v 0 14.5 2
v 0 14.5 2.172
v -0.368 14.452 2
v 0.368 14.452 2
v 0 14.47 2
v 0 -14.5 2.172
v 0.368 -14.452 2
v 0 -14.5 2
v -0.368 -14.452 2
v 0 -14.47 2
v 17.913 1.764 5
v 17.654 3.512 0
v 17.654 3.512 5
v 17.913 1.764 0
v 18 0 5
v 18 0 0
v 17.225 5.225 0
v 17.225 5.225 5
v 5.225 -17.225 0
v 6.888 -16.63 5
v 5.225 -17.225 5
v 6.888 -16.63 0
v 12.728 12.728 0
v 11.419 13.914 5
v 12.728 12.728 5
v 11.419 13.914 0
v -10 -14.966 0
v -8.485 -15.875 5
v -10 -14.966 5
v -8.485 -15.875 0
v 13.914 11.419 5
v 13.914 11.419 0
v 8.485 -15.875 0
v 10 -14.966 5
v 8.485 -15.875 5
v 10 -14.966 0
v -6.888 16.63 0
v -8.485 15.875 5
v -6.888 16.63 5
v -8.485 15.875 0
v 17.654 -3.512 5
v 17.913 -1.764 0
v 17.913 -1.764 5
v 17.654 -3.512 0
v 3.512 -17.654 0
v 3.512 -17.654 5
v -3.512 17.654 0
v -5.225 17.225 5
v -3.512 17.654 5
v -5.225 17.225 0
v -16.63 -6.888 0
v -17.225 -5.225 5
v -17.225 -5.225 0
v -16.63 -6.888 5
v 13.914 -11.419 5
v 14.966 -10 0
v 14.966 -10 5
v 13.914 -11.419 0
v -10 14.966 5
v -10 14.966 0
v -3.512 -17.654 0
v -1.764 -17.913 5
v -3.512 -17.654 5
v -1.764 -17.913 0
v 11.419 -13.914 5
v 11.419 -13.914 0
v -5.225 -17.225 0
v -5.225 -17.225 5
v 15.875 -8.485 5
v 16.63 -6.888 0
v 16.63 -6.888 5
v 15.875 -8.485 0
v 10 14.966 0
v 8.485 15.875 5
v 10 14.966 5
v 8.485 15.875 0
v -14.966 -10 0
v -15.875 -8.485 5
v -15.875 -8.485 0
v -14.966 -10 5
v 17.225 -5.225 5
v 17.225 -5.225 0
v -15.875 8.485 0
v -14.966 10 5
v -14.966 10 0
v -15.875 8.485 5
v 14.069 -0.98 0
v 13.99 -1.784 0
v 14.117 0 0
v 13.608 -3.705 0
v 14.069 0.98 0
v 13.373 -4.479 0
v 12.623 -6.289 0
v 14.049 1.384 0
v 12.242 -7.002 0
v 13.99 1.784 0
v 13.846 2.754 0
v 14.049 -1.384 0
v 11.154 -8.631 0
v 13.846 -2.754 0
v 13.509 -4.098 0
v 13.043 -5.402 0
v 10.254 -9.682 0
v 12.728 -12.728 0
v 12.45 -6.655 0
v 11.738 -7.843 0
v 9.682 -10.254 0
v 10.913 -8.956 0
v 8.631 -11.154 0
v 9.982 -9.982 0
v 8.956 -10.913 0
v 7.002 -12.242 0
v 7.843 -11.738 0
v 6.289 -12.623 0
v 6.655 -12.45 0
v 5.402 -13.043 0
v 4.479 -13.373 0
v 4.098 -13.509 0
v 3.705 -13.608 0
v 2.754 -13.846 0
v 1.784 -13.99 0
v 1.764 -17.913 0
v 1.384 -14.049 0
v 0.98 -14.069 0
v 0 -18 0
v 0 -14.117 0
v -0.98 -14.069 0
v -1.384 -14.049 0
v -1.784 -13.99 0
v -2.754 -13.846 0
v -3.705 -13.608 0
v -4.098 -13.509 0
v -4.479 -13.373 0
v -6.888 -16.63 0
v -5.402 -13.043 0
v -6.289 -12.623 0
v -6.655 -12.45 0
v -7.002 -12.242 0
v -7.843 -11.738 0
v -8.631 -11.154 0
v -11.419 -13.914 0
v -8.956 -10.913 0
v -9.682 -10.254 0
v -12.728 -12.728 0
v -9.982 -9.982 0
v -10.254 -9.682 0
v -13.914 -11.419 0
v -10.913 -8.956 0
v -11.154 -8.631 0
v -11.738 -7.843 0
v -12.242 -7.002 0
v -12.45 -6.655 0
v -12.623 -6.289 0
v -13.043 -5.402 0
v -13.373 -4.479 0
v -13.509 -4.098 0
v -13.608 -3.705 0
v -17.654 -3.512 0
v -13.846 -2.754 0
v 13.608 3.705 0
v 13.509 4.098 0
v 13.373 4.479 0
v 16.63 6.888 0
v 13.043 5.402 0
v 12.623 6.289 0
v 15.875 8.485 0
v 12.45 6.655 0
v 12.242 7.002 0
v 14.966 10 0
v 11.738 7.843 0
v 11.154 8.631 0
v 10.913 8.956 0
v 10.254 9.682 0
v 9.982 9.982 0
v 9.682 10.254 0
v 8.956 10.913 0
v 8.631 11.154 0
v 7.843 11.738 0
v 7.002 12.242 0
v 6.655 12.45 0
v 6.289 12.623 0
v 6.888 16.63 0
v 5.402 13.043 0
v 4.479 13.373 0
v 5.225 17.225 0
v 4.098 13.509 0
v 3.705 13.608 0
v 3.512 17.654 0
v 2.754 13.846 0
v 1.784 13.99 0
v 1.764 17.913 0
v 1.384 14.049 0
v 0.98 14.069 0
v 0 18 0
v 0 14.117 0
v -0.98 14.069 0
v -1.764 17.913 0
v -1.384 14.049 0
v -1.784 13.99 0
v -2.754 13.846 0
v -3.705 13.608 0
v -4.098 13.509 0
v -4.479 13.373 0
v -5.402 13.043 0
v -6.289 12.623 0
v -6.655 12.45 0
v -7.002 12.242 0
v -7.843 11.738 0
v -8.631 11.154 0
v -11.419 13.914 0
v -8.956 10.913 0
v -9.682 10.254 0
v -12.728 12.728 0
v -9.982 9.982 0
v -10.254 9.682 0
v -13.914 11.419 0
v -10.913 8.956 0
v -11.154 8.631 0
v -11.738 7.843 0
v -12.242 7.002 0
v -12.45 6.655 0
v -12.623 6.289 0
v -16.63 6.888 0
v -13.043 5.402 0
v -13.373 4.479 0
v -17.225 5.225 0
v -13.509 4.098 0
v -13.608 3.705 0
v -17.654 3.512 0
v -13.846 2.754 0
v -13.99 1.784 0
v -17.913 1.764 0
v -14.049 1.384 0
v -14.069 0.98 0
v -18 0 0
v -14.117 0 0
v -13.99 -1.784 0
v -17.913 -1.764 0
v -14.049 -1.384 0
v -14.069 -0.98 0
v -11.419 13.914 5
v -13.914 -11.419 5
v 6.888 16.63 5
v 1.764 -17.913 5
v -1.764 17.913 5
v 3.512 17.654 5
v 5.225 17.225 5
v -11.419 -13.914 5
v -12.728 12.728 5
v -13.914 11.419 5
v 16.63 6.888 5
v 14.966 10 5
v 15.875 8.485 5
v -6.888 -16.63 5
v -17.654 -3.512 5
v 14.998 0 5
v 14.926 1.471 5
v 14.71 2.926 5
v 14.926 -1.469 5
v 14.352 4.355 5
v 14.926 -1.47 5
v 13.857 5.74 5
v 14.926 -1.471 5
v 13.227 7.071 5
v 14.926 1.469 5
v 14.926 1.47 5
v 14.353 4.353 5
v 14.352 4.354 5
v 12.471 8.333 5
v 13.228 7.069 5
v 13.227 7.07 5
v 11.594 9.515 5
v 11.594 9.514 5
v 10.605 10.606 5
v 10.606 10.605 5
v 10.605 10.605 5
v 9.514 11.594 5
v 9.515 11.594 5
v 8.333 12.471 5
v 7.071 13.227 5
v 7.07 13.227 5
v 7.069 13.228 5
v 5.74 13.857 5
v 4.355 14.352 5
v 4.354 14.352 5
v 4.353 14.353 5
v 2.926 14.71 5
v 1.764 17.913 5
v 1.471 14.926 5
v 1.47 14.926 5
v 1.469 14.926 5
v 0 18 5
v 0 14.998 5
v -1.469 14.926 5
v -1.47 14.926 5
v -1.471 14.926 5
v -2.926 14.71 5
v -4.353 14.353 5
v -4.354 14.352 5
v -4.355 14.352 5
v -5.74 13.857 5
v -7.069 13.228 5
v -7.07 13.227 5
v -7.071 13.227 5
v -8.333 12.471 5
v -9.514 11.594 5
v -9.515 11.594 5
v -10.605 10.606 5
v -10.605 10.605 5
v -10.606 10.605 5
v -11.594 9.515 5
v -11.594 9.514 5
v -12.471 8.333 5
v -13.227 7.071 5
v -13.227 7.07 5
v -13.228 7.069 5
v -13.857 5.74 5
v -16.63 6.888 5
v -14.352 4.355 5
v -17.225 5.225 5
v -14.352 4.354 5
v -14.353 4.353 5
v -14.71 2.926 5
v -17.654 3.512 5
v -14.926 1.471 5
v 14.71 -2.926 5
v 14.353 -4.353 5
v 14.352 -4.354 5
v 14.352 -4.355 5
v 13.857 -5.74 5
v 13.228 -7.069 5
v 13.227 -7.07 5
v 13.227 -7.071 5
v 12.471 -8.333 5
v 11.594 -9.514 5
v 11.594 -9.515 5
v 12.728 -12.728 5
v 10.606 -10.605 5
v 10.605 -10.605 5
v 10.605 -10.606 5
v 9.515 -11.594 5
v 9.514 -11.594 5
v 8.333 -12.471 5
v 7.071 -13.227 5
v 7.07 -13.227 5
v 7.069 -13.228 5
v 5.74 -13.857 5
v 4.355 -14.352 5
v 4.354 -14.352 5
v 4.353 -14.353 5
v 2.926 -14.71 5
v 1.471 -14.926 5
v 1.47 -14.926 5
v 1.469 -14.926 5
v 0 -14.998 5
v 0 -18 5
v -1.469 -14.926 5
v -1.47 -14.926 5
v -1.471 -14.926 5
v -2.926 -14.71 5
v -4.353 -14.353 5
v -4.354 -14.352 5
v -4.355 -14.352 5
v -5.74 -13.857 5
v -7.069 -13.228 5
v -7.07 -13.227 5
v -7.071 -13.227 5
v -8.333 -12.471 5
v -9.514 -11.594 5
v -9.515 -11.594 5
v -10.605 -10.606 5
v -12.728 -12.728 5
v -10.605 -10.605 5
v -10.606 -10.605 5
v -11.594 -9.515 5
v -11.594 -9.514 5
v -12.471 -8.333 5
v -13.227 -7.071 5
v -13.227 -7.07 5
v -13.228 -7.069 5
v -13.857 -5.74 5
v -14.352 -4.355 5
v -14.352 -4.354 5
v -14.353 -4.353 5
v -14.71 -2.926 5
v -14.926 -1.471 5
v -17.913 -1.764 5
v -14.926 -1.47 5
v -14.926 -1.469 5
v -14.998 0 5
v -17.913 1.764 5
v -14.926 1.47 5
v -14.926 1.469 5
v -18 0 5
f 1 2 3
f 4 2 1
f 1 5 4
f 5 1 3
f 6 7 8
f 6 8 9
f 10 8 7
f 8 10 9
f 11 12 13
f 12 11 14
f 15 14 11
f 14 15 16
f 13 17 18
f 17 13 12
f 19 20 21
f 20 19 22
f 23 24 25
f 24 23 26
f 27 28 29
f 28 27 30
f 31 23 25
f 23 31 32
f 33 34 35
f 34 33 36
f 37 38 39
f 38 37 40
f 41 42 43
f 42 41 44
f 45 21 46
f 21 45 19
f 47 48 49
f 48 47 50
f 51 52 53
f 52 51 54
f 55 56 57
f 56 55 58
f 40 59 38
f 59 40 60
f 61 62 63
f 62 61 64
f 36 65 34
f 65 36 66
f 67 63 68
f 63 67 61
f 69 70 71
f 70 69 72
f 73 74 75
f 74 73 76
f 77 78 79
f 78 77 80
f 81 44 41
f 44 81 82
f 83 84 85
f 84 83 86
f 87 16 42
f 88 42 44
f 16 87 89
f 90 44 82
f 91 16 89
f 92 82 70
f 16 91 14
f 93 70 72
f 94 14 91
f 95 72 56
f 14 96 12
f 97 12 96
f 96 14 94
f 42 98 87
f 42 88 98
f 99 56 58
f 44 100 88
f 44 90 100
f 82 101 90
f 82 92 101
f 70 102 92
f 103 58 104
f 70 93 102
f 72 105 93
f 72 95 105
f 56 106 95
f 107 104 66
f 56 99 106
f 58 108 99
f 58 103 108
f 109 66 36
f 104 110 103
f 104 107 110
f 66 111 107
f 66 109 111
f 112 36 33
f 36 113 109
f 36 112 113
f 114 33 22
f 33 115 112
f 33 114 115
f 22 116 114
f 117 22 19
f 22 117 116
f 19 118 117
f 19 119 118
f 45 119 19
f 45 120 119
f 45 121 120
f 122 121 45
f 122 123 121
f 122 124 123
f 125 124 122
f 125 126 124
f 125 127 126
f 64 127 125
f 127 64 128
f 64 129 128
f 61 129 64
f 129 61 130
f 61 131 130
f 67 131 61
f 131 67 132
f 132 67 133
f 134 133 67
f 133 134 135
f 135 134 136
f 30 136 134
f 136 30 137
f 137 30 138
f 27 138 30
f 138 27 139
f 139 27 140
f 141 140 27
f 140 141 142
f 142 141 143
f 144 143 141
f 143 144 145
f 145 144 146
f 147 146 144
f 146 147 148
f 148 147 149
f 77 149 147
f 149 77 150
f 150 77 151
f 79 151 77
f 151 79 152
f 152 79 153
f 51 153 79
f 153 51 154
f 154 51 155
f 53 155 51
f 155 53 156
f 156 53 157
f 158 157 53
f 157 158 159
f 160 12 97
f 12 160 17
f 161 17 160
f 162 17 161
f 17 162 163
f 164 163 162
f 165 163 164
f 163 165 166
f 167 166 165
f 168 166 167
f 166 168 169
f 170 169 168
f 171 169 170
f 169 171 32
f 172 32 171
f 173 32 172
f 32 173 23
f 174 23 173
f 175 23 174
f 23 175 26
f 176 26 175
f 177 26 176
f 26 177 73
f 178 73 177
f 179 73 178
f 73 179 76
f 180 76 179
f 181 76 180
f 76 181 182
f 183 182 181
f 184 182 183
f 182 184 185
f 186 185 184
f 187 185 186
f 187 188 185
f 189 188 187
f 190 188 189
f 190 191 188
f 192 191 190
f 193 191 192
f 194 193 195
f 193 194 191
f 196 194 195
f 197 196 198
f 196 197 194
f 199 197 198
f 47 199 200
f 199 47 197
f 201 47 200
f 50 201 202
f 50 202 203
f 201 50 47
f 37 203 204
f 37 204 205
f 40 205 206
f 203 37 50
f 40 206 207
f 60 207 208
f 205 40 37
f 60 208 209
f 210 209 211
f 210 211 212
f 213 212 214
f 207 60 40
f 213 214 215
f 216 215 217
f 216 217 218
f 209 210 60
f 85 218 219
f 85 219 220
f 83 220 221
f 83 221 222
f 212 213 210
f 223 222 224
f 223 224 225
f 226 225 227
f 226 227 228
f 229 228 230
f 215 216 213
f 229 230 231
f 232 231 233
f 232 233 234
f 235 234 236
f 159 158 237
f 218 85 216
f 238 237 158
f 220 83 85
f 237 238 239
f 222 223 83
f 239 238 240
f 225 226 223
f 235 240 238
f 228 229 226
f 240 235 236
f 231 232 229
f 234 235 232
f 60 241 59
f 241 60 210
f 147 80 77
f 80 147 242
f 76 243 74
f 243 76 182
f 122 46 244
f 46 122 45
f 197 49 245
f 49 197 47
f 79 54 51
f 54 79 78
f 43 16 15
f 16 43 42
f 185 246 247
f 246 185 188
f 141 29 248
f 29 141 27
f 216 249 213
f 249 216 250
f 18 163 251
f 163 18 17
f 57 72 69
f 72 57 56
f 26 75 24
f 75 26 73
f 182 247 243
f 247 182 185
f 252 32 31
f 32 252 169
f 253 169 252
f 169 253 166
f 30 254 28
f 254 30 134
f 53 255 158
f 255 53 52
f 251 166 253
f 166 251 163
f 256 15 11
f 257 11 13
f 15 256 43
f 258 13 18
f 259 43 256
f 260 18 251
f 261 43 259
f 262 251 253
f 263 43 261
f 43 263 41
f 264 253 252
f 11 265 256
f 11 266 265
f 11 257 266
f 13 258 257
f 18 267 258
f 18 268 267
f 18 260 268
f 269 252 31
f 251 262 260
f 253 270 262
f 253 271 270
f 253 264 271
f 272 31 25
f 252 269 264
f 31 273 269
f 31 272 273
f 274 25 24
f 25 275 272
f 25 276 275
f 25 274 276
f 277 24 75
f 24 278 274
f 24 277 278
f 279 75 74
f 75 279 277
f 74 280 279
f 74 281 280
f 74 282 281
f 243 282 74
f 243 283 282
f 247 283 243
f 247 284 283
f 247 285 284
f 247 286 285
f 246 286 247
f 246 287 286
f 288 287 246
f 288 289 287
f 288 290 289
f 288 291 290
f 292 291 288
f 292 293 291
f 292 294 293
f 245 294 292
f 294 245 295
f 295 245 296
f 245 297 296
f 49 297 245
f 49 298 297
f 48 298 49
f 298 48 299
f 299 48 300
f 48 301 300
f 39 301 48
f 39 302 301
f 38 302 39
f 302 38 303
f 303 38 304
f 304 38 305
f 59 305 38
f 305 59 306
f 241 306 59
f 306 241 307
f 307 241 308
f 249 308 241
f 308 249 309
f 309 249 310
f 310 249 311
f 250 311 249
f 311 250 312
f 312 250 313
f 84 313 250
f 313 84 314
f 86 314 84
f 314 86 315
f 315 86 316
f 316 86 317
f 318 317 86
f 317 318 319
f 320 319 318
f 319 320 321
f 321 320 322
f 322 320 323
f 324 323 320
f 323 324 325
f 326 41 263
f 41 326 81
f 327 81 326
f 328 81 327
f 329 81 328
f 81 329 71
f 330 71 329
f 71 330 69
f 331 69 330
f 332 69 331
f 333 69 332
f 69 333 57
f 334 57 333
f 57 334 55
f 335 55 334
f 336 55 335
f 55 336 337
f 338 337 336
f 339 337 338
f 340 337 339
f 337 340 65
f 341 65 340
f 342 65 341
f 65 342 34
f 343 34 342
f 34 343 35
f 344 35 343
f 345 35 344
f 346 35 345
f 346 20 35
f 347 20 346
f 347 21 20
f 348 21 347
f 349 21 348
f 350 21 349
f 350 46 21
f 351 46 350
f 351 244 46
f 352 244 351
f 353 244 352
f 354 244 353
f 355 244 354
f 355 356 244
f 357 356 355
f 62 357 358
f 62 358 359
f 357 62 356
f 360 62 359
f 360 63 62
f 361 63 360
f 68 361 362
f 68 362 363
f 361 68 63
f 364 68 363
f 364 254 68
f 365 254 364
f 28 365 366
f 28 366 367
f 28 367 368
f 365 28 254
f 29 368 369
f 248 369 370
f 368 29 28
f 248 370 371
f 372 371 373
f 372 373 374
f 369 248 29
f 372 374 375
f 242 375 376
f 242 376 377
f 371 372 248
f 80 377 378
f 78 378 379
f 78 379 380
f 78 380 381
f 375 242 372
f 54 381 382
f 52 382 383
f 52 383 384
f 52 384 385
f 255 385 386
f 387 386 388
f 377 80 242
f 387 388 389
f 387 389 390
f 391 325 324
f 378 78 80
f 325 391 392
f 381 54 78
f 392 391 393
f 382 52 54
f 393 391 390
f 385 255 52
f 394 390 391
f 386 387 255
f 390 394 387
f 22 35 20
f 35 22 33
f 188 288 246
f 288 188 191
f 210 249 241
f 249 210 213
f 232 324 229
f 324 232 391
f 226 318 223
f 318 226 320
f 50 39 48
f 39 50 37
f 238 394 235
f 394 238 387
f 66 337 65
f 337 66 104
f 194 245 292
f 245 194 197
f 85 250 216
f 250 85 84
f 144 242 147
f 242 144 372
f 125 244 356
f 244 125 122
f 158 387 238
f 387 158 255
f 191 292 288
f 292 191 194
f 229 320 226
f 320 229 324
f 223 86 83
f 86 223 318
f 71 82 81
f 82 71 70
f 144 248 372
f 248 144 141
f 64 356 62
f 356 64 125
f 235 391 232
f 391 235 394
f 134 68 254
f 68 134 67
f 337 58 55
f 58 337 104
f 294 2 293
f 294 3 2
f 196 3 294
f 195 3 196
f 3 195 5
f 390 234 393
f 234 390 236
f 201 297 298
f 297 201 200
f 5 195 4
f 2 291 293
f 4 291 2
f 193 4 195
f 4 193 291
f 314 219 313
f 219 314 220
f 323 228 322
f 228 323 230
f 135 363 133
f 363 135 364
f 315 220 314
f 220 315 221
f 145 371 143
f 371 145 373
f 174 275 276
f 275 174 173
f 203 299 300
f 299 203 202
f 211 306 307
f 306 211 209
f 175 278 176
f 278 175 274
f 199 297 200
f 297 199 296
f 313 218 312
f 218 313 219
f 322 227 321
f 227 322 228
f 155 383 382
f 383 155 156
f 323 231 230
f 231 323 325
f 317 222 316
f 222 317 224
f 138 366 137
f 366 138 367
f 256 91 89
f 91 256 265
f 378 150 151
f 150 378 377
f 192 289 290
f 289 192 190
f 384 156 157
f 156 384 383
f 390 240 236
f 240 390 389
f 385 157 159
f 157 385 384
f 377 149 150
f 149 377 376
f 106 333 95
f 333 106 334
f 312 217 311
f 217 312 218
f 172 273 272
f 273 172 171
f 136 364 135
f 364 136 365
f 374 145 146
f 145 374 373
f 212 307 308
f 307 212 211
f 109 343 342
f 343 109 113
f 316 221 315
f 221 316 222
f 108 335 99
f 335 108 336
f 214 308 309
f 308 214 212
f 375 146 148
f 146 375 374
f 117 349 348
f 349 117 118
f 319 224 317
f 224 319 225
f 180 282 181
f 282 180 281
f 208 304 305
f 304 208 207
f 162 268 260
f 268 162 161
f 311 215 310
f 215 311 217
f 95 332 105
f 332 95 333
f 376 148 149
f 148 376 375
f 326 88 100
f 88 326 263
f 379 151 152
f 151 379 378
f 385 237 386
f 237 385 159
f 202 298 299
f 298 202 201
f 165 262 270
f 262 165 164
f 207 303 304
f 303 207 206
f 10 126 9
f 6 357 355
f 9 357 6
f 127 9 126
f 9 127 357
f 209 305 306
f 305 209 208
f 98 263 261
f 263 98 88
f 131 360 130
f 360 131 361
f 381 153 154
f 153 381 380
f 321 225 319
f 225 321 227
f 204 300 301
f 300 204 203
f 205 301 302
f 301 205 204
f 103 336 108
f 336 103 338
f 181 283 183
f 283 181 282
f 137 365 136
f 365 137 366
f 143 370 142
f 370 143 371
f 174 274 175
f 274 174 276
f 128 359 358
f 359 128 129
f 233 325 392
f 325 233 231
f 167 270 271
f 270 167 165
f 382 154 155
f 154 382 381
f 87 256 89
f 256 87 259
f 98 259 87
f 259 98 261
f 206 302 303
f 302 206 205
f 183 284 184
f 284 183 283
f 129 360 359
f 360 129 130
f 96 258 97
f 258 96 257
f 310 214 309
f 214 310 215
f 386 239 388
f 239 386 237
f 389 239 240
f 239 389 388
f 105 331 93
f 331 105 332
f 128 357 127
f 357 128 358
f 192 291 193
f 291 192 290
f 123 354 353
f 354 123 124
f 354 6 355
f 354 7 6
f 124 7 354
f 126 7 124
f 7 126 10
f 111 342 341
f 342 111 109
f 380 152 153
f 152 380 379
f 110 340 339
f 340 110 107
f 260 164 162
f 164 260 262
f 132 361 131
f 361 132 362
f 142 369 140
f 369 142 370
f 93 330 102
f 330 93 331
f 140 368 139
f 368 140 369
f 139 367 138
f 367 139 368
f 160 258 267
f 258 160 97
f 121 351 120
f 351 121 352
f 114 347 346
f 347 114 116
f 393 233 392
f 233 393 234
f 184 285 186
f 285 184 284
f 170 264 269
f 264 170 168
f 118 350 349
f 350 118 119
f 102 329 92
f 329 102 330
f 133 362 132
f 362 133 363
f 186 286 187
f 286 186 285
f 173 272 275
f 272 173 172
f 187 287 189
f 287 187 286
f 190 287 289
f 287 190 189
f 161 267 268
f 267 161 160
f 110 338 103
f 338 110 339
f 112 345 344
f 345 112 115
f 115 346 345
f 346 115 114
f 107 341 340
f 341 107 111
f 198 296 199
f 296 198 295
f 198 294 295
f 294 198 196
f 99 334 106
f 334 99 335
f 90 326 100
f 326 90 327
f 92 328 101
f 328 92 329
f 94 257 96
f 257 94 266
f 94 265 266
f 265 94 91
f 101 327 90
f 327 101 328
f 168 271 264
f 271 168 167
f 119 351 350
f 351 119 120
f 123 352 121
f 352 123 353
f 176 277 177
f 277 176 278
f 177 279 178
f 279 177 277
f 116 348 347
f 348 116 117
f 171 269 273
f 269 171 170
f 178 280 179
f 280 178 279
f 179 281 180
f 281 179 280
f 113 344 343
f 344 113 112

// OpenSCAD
// Tool changer — Berkeley passive tool changer (truncated cone + magnets + dowels)
// Port of hardware/cad/tool_changer.py
// Regenerate:
//   openscad -o hardware/stl/tool_cone_robot.stl -D 'PART="robot"' hardware/scad/tool_changer.scad
//   openscad -o hardware/stl/tool_cone_pipette.stl -D 'PART="male"' hardware/scad/tool_changer.scad
//   openscad -o hardware/stl/tool_cone_gripper.stl -D 'PART="male"' hardware/scad/tool_changer.scad
//   openscad -o hardware/stl/tool_cone_hook.stl -D 'PART="male"' hardware/scad/tool_changer.scad

// Part selector: "robot" (female) or "male" (tool-side)
PART = "robot";

// Parameters (mm) — Berkeley design
WRIST_SCREW_PATTERN_RADIUS = 9.0;
WRIST_SCREW_DIAMETER       = 3.2;   // M3 clearance
CONE_ANGLE_DEG             = 10.0;
CONE_HEIGHT                = 15.0;
CONE_TOP_RADIUS            = 15.0;
CONE_BOTTOM_RADIUS         = CONE_TOP_RADIUS - CONE_HEIGHT * tan(CONE_ANGLE_DEG);
DOWEL_DIAMETER             = 3.0;
DOWEL_HEIGHT               = 8.0;
DOWEL_OFFSET               = 10.0;
MAGNET_DIAMETER            = 5.0;
MAGNET_DEPTH               = 3.0;
MAGNET_OFFSET              = 12.0;
BASE_THICKNESS             = 5.0;
BASE_RADIUS                = CONE_TOP_RADIUS + 3;  // 18.0
MALE_CLEARANCE             = 0.3;
MALE_DOWEL_CLEARANCE       = 0.1;

// Truncated cone (frustum) via rotate_extrude of a trapezoid profile
module frustum(r_bottom, r_top, h) {
    rotate_extrude($fn = 64)
        polygon(points = [
            [0, 0],
            [r_bottom, 0],
            [r_top, h],
            [0, h]
        ]);
}

// Robot-side adapter (female) — conical pocket, screw holes, dowel holes, magnet pockets
module robot_cone() {
    difference() {
        // Base cylinder
        cylinder(h = BASE_THICKNESS, r = BASE_RADIUS, $fn = 64);

        // Conical pocket (cut from top)
        translate([0, 0, BASE_THICKNESS - CONE_HEIGHT])
            frustum(CONE_BOTTOM_RADIUS, CONE_TOP_RADIUS, CONE_HEIGHT + 0.01);

        // M3 mounting holes (4x at 90° intervals, offset 45°)
        for (a = [45, 135, 225, 315])
            translate([
                WRIST_SCREW_PATTERN_RADIUS * cos(a),
                WRIST_SCREW_PATTERN_RADIUS * sin(a),
                -0.5
            ])
                cylinder(h = BASE_THICKNESS + 1, d = WRIST_SCREW_DIAMETER, $fn = 24);

        // Dowel pin holes (2x opposing)
        for (a = [0, 180])
            translate([
                DOWEL_OFFSET * cos(a),
                DOWEL_OFFSET * sin(a),
                BASE_THICKNESS - DOWEL_HEIGHT
            ])
                cylinder(h = DOWEL_HEIGHT + 0.01, d = DOWEL_DIAMETER, $fn = 24);

        // Magnet pockets (2x opposing, perpendicular to dowels)
        for (a = [90, 270])
            translate([
                MAGNET_OFFSET * cos(a),
                MAGNET_OFFSET * sin(a),
                BASE_THICKNESS - MAGNET_DEPTH
            ])
                cylinder(h = MAGNET_DEPTH + 0.01, d = MAGNET_DIAMETER, $fn = 24);
    }
}

// Tool-side adapter (male) — cone protrusion, dowel pins, magnet pockets
module male_cone() {
    difference() {
        union() {
            // Base plate
            cylinder(h = BASE_THICKNESS, r = BASE_RADIUS, $fn = 64);

            // Cone protrusion
            r_top_m    = CONE_TOP_RADIUS - MALE_CLEARANCE;
            r_bottom_m = CONE_BOTTOM_RADIUS - MALE_CLEARANCE;
            translate([0, 0, BASE_THICKNESS])
                frustum(r_bottom_m, r_top_m, CONE_HEIGHT);

            // Dowel pins (2x opposing)
            dowel_d_m = DOWEL_DIAMETER - MALE_DOWEL_CLEARANCE * 2;
            for (a = [0, 180])
                translate([
                    DOWEL_OFFSET * cos(a),
                    DOWEL_OFFSET * sin(a),
                    BASE_THICKNESS + CONE_HEIGHT
                ])
                    cylinder(h = DOWEL_HEIGHT, d = dowel_d_m, $fn = 24);
        }

        // Magnet pockets (2x opposing, perpendicular to dowels)
        for (a = [90, 270])
            translate([
                MAGNET_OFFSET * cos(a),
                MAGNET_OFFSET * sin(a),
                BASE_THICKNESS - MAGNET_DEPTH
            ])
                cylinder(h = MAGNET_DEPTH + 0.01, d = MAGNET_DIAMETER, $fn = 24);
    }
}

// Render selected part
if (PART == "robot") {
    robot_cone();
} else {
    male_cone();
}
